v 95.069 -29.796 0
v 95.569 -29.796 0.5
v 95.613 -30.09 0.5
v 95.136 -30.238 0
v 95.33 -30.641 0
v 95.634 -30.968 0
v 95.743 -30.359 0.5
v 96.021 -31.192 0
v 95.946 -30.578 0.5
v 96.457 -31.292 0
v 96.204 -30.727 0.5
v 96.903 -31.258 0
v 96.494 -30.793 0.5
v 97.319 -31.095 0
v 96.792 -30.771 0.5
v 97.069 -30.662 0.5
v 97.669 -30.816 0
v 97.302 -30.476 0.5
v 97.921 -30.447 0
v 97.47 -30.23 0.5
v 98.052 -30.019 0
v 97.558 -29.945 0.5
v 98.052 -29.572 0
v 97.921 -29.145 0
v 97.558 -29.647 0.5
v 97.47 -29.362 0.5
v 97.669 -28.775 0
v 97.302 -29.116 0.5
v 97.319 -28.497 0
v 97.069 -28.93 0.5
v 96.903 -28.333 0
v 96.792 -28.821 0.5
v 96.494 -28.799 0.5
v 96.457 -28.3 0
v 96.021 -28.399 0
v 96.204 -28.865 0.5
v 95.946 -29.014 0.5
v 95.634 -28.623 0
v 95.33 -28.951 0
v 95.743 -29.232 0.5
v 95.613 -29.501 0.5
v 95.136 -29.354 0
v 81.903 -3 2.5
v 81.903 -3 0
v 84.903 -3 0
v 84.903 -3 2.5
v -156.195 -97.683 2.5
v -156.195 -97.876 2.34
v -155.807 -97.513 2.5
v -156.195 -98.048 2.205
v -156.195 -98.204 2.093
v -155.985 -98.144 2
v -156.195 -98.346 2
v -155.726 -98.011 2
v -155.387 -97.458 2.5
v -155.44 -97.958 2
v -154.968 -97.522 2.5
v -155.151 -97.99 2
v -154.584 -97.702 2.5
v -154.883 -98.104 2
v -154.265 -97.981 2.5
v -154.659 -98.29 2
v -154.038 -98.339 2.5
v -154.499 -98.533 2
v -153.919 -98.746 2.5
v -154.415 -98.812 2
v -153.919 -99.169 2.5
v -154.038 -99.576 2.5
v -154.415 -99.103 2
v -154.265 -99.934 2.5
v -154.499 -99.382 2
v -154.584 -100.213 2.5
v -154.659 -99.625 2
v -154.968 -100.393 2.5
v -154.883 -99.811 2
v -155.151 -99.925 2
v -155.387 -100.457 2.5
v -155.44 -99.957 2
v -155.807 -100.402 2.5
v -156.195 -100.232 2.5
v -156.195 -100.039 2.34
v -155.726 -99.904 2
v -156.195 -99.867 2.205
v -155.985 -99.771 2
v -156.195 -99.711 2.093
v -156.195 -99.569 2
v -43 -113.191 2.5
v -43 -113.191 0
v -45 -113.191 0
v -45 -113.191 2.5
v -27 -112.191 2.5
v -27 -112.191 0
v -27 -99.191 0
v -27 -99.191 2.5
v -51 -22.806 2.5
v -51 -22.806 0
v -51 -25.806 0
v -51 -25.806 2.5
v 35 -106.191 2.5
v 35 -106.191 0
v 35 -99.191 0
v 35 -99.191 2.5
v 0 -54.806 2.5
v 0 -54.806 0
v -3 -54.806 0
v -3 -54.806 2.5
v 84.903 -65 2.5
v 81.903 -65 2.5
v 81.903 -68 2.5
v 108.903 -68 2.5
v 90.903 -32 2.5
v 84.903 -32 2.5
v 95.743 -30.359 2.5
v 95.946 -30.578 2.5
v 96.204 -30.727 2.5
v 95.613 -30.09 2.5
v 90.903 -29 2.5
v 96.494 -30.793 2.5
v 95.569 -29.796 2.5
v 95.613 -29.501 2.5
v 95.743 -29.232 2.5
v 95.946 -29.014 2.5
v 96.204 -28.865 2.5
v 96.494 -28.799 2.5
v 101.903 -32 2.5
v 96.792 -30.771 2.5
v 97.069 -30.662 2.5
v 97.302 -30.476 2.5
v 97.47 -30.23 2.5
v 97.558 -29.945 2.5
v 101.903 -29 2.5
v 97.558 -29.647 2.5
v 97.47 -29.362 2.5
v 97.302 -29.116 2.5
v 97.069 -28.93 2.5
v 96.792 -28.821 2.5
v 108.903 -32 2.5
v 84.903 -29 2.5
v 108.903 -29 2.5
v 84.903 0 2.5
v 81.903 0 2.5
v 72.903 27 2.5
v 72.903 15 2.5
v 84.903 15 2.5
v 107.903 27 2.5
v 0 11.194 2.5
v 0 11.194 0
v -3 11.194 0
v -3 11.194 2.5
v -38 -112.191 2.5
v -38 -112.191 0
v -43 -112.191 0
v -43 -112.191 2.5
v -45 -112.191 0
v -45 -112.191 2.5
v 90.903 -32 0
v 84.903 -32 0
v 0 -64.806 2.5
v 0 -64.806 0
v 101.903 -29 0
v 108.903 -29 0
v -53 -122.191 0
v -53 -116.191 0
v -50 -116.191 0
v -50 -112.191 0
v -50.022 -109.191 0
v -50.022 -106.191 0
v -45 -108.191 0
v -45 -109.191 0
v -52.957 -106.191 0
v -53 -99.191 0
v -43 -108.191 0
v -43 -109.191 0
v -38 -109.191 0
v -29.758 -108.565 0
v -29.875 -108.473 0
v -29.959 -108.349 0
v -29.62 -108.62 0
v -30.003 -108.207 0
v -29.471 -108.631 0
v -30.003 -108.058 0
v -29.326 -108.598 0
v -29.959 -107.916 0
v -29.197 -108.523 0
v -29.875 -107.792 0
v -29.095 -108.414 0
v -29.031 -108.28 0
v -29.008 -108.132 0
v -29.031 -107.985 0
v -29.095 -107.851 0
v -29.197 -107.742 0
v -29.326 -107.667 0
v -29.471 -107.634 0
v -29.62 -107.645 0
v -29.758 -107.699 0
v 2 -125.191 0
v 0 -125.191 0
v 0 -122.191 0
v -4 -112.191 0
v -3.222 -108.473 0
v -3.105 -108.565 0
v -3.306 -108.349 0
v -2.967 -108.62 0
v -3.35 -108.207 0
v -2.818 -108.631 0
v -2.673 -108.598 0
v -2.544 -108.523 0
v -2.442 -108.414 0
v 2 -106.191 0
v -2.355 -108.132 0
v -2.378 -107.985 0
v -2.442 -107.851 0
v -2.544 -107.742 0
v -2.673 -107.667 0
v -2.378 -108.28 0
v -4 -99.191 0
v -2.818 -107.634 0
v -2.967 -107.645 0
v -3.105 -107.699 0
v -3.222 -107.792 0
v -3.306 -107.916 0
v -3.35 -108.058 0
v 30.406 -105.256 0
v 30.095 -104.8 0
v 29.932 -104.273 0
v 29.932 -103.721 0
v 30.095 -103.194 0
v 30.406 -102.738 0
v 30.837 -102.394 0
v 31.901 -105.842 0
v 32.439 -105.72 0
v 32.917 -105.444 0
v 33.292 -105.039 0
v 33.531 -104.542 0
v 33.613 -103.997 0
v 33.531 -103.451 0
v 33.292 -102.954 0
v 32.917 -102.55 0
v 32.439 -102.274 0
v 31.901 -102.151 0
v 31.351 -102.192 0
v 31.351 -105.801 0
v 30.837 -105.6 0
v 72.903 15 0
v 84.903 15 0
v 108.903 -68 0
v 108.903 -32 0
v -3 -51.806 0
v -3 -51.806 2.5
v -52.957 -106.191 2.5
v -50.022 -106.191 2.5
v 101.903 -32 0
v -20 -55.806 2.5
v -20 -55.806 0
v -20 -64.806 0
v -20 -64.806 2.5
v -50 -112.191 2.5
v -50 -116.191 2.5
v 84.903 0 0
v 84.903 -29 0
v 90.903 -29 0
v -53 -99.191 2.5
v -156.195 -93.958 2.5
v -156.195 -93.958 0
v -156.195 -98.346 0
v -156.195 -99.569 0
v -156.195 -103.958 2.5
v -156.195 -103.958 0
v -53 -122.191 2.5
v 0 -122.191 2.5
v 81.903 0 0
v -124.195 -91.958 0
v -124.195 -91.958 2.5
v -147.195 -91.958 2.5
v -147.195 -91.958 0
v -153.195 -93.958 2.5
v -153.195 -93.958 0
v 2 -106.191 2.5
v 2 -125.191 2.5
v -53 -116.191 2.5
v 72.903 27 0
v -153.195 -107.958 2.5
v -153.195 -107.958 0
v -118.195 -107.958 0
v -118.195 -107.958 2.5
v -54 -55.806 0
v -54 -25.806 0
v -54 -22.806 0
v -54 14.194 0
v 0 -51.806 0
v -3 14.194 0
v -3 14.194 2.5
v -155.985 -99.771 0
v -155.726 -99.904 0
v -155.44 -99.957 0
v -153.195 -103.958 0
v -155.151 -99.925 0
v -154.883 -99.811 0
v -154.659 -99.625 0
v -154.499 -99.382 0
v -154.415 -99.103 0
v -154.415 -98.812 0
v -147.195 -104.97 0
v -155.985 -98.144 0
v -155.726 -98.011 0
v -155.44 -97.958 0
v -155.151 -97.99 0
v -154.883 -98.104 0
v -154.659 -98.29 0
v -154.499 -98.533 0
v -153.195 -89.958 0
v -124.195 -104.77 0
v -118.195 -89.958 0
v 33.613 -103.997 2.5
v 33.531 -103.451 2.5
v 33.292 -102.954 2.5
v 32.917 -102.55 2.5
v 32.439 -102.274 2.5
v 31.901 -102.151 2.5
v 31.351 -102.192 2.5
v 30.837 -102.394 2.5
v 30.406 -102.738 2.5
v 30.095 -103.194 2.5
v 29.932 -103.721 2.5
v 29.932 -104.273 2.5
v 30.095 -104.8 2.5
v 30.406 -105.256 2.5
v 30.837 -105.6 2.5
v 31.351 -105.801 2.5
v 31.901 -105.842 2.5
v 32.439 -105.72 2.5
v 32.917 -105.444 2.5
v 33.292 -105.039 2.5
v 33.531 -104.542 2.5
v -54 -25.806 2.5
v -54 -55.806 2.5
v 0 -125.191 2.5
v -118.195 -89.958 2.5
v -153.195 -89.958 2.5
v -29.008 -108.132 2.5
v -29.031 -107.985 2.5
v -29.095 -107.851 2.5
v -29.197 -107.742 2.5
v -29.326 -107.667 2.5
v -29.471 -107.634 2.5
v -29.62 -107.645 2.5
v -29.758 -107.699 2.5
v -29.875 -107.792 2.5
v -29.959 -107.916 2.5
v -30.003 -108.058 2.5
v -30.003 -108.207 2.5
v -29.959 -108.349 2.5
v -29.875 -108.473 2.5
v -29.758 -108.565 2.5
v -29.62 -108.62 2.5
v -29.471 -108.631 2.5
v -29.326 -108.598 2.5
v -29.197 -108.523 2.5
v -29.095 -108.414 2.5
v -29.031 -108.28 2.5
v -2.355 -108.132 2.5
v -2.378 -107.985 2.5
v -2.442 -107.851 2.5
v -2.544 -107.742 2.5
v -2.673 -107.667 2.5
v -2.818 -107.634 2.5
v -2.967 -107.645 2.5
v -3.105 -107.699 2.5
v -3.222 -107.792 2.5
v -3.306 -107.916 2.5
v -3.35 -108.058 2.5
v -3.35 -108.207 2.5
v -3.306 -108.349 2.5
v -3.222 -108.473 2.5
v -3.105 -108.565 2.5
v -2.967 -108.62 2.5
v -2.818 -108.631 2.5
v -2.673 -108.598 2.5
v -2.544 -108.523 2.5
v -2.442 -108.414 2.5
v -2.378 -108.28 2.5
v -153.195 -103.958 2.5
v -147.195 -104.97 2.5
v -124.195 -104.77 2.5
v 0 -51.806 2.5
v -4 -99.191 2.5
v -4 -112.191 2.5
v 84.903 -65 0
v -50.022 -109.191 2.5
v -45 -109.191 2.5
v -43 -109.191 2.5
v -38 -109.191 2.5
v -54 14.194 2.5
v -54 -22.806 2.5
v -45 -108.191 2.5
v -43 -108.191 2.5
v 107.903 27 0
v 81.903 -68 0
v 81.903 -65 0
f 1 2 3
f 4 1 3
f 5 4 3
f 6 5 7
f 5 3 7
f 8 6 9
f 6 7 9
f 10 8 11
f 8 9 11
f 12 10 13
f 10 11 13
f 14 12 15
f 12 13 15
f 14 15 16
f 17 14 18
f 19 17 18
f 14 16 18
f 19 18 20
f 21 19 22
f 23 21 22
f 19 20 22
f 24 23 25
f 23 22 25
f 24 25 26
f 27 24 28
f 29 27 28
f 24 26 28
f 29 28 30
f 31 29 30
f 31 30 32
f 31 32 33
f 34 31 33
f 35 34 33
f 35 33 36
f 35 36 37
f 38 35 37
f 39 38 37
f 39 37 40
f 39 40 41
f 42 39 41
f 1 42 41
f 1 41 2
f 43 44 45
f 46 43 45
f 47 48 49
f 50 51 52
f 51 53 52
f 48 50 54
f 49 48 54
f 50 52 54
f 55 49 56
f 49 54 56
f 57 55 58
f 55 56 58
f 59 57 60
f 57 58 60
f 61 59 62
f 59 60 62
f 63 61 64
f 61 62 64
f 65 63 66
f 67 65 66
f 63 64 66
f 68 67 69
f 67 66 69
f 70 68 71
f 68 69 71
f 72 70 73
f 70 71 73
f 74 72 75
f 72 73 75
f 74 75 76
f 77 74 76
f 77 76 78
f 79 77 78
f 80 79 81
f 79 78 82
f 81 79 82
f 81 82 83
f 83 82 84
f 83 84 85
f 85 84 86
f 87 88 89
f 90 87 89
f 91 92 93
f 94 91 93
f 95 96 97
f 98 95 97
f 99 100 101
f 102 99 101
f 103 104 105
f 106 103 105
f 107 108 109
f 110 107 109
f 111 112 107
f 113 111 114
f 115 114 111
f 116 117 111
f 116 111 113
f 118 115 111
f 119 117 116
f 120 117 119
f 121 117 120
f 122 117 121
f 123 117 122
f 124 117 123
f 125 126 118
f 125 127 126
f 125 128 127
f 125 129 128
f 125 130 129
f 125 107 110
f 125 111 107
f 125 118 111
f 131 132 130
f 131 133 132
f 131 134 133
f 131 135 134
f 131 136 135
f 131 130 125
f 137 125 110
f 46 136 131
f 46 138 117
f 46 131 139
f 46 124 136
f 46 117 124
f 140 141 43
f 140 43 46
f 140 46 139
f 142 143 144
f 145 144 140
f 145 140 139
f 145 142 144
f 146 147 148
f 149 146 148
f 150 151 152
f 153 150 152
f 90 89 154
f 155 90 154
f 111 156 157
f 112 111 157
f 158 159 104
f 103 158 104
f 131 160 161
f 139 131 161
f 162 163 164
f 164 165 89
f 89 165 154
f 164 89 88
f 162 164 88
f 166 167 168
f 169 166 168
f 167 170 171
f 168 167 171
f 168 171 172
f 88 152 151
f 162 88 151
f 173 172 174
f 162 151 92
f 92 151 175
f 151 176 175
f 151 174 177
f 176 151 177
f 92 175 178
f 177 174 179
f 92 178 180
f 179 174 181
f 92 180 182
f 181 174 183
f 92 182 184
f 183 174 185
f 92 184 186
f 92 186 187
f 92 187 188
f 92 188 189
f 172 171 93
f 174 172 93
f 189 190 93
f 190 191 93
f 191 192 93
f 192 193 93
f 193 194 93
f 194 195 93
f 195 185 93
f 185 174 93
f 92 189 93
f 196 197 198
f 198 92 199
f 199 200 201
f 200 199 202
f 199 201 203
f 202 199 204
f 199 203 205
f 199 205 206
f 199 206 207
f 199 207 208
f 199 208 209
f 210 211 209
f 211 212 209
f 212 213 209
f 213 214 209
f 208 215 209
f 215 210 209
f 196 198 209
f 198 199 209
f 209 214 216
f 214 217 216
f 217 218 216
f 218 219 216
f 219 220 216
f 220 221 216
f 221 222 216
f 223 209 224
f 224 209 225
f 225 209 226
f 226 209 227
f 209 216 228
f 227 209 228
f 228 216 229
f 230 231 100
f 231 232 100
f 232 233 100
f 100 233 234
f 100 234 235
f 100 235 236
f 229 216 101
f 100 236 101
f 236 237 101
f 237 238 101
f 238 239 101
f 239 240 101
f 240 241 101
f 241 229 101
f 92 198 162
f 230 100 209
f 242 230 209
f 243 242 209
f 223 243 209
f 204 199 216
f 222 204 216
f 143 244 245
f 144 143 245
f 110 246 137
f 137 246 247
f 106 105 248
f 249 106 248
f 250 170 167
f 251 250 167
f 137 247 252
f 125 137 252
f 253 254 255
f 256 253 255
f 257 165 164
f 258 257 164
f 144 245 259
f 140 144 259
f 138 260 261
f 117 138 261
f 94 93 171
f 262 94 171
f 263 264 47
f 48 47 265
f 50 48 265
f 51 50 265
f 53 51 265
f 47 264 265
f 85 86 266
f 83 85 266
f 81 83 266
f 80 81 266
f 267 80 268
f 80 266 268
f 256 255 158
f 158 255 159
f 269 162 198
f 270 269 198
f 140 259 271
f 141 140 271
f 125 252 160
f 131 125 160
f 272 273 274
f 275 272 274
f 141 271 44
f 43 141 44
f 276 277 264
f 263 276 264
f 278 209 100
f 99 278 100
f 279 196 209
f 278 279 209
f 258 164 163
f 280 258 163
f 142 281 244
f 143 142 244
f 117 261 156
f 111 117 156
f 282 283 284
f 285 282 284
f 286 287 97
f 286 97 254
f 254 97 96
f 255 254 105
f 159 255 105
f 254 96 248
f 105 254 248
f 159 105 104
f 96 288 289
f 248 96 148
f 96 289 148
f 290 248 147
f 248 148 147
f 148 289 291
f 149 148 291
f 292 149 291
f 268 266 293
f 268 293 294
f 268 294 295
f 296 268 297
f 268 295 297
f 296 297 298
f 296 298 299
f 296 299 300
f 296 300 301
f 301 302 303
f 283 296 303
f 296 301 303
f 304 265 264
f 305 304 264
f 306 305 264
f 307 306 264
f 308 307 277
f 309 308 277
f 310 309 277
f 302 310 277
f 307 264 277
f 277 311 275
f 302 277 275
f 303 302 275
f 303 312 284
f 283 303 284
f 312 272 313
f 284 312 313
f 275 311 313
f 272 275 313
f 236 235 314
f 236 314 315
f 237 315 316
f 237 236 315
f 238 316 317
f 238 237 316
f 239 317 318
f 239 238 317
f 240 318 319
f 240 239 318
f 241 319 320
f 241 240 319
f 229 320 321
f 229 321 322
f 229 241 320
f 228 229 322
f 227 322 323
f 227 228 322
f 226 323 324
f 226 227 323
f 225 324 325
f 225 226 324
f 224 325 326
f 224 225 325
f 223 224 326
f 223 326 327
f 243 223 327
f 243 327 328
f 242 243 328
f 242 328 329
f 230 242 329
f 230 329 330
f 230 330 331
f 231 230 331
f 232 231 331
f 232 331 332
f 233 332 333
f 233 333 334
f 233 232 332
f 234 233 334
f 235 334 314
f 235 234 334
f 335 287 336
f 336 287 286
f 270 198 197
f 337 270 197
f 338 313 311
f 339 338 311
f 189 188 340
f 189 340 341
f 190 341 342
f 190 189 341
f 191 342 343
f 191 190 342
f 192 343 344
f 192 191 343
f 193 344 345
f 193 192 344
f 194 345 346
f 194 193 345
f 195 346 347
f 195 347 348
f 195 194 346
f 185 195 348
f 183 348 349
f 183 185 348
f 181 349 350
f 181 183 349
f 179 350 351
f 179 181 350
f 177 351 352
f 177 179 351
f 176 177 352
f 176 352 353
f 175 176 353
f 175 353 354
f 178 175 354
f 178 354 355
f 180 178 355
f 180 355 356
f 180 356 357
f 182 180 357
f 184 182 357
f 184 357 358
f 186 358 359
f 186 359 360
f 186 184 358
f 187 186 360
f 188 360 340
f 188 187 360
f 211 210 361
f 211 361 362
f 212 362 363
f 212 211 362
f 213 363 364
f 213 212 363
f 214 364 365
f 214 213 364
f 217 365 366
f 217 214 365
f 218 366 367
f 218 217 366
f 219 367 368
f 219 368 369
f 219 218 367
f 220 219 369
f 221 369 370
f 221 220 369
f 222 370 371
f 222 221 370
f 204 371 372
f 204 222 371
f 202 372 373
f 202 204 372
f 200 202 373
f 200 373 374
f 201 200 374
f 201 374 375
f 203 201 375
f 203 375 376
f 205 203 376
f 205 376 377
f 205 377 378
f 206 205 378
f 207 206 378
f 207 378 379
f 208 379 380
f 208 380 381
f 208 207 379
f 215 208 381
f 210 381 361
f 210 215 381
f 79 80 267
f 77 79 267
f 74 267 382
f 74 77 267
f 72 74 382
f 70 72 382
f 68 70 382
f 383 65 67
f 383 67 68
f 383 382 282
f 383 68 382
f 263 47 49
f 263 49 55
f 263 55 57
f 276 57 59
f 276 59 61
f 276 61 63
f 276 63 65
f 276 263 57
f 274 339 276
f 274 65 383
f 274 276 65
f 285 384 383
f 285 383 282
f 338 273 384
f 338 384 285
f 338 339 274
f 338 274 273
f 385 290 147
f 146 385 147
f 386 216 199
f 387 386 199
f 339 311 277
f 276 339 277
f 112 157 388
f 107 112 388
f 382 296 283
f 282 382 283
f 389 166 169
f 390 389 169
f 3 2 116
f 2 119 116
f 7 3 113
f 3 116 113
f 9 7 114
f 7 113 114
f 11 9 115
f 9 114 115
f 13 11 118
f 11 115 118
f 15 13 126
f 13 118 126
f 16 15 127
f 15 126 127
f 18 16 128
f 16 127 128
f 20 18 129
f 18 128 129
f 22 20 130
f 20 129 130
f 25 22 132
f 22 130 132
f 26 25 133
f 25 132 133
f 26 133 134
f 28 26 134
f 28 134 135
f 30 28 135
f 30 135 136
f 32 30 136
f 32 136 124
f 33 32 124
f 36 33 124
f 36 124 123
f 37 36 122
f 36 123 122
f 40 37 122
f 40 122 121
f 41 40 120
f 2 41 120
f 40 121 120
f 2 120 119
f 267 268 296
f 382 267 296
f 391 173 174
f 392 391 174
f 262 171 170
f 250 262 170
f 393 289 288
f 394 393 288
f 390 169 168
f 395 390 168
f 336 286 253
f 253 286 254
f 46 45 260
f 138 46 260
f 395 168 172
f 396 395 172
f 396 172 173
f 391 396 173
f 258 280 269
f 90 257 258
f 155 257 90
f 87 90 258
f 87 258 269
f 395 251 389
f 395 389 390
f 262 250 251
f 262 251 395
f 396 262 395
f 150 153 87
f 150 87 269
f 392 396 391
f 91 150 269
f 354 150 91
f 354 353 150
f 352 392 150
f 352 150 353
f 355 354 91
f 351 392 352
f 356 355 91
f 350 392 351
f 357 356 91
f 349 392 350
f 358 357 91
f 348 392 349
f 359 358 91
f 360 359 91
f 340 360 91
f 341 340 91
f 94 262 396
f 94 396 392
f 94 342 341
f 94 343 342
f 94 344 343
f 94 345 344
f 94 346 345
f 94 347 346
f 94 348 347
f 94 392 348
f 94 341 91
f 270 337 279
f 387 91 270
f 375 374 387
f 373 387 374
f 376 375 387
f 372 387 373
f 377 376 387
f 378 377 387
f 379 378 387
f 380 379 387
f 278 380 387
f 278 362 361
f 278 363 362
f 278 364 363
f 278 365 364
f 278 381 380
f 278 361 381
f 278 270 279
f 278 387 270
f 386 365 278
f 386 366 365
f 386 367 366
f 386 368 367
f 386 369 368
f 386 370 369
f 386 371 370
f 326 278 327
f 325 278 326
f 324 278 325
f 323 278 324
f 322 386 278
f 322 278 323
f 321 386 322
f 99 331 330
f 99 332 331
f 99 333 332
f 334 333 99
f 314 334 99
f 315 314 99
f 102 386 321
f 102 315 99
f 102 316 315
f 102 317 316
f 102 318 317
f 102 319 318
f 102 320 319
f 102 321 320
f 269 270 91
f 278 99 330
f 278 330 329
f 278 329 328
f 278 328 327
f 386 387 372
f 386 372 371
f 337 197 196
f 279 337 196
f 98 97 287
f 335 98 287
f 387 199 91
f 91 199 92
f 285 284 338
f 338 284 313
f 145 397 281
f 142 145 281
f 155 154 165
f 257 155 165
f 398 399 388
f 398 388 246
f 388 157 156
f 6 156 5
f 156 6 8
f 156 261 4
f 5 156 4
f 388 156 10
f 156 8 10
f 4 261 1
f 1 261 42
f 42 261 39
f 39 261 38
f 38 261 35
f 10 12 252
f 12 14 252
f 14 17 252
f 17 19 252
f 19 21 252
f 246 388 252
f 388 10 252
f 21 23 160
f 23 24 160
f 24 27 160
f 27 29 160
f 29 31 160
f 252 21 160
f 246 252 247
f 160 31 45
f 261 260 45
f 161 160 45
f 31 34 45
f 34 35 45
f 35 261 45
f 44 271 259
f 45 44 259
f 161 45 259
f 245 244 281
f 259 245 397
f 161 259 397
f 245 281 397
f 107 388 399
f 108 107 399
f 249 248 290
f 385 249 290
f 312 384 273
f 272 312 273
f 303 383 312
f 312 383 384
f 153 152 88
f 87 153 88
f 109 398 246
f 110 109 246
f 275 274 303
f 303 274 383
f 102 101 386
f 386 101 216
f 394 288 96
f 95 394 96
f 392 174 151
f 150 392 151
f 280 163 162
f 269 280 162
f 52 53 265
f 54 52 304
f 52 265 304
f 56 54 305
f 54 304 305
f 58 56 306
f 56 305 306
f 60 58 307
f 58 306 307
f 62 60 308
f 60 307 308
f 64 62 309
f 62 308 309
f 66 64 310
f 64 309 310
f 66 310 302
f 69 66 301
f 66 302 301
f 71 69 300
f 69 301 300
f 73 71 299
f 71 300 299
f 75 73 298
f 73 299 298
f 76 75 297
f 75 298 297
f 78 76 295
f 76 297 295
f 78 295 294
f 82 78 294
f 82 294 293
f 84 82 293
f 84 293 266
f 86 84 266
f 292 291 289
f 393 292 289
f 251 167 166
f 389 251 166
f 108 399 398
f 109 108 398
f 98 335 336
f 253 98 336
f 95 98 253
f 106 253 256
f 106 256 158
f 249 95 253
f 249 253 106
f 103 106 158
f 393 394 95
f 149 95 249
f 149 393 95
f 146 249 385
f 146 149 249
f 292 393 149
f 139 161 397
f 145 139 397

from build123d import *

# Parameters (mm, degrees)
F1_DEPTH       = 2.5
F3_DEPTH       = 2.5
F5_D           = 2
F5_CSINK_D     = 3
F5_CSINK_ANGLE = 90
F7_DEPTH       = 2.5
F9_D           = 2
F9_CSINK_D     = 3
F9_CSINK_ANGLE = 90
F11_DEPTH      = 2.5
F12_R          = 0.5
F12_R_2        = 1.8508453111
F13_DEPTH      = 2.5


with BuildPart() as f1:
    # F0 (on Top) → F1 (new body)
    with BuildSketch(Plane.XY):
        Polygon((-54, -25.8063164353), (-54, -55.8063164353), (-20, -55.8063164353), (-20, -64.8063164353), (0, -64.8063164353), (0, -54.8063164353), (-3, -54.8063164353), (-3, -51.8063164353), (0, -51.8063164353), (0, 11.1936835647), (-3, 11.1936835647), (-3, 14.1936835647), (-54, 14.1936835647), (-54, -22.8063164353), (-51, -22.8063164353), (-51, -25.8063164353), align=None)
    extrude(amount=F1_DEPTH)


with BuildPart() as f3:
    # F2 (on Top) → F3 (new body)
    with BuildSketch(Plane.XY):
        Polygon((108.903167069, -29), (107.903167069, 27), (72.903167069, 27), (72.903167069, 15), (84.903167069, 15), (84.903167069, 0), (81.903167069, 0), (81.903167069, -3), (84.903167069, -3), (84.903167069, -29), (90.903167069, -29), (90.903167069, -32), (84.903167069, -32), (84.903167069, -65), (81.903167069, -65), (81.903167069, -68), (108.903167069, -68), (108.903167069, -32), (101.903167069, -32), (101.903167069, -29), align=None)
    extrude(amount=F3_DEPTH)

    # F5 (through all)
    with Locations(Plane(origin=(0, 0, 0), x_dir=(1, 0, 0), z_dir=(0, 0, -1))):
        with Locations((96.5690612793, 29.7957230359)):
            CounterSinkHole(F5_D / 2, F5_CSINK_D / 2, counter_sink_angle=F5_CSINK_ANGLE)


with BuildPart() as f7:
    # F6 (on Top) → F7 (new body)
    with BuildSketch(Plane.XY):
        Polygon((-118.1951190233, -89.9575352669), (-153.1951190233, -89.9575352669), (-153.1951190233, -93.9575352669), (-156.1951190233, -93.9575352669), (-156.1951190233, -103.9575352669), (-153.1951190233, -103.9575352669), (-153.1951190233, -107.9575352669), (-118.1951190233, -107.9575352669), align=None)
    extrude(amount=F7_DEPTH)

    # F9 (through all)
    with Locations(Plane.XY.offset(2.5)):
        with Locations((-155.4041057825, -98.9575352669)):
            CounterSinkHole(F9_D / 2, F9_CSINK_D / 2, counter_sink_angle=F9_CSINK_ANGLE)

    # F10 (on face) → F11 (cut)
    with BuildSketch(Plane.XY.offset(2.5)):
        Polygon((-124.1951190233, -104.7698929906), (-124.1951190233, -93.0094867945), (-124.1951190233, -91.9575352669), (-147.1951190233, -91.9575352669), (-147.1951190233, -104.970395565), align=None)
    extrude(amount=-F11_DEPTH, mode=Mode.SUBTRACT)


with BuildPart() as f13:
    # F12 (on Top) → F13 (new body)
    with BuildSketch(Plane.XY):
        Polygon((-27, -99.1912931204), (-53, -99.1912931204), (-52.9571399093, -106.1912931204), (-50.0222370028, -106.1912931204), (-50.0222370028, -109.1912931204), (-45, -109.1912931204), (-45, -108.1912931204), (-43, -108.1912931204), (-43, -109.1912931204), (-38, -109.1912931204), (-38, -112.1912931204), (-43, -112.1912931204), (-43, -113.1912931204), (-45, -113.1912931204), (-45, -112.1912931204), (-50, -112.1912931204), (-50, -116.1912931204), (-53, -116.1912931204), (-53, -122.1912931204), (0, -122.1912931204), (0, -125.1912931204), (2, -125.1912931204), (2, -106.1912931204), (35, -106.1912931204), (35, -99.1912931204), (-4, -99.1912931204), (-4, -112.1912931204), (-27, -112.1912931204), align=None)
        with Locations((-29.508298263, -108.132481575)):
            Circle(F12_R, mode=Mode.SUBTRACT)
        with Locations((-2.8554352466, -108.132481575)):
            Circle(F12_R, mode=Mode.SUBTRACT)
        with Locations((31.7626520991, -103.996694088)):
            Circle(F12_R_2, mode=Mode.SUBTRACT)
    extrude(amount=F13_DEPTH)


solid = Compound([f1.part, f3.part, f7.part, f13.part])
